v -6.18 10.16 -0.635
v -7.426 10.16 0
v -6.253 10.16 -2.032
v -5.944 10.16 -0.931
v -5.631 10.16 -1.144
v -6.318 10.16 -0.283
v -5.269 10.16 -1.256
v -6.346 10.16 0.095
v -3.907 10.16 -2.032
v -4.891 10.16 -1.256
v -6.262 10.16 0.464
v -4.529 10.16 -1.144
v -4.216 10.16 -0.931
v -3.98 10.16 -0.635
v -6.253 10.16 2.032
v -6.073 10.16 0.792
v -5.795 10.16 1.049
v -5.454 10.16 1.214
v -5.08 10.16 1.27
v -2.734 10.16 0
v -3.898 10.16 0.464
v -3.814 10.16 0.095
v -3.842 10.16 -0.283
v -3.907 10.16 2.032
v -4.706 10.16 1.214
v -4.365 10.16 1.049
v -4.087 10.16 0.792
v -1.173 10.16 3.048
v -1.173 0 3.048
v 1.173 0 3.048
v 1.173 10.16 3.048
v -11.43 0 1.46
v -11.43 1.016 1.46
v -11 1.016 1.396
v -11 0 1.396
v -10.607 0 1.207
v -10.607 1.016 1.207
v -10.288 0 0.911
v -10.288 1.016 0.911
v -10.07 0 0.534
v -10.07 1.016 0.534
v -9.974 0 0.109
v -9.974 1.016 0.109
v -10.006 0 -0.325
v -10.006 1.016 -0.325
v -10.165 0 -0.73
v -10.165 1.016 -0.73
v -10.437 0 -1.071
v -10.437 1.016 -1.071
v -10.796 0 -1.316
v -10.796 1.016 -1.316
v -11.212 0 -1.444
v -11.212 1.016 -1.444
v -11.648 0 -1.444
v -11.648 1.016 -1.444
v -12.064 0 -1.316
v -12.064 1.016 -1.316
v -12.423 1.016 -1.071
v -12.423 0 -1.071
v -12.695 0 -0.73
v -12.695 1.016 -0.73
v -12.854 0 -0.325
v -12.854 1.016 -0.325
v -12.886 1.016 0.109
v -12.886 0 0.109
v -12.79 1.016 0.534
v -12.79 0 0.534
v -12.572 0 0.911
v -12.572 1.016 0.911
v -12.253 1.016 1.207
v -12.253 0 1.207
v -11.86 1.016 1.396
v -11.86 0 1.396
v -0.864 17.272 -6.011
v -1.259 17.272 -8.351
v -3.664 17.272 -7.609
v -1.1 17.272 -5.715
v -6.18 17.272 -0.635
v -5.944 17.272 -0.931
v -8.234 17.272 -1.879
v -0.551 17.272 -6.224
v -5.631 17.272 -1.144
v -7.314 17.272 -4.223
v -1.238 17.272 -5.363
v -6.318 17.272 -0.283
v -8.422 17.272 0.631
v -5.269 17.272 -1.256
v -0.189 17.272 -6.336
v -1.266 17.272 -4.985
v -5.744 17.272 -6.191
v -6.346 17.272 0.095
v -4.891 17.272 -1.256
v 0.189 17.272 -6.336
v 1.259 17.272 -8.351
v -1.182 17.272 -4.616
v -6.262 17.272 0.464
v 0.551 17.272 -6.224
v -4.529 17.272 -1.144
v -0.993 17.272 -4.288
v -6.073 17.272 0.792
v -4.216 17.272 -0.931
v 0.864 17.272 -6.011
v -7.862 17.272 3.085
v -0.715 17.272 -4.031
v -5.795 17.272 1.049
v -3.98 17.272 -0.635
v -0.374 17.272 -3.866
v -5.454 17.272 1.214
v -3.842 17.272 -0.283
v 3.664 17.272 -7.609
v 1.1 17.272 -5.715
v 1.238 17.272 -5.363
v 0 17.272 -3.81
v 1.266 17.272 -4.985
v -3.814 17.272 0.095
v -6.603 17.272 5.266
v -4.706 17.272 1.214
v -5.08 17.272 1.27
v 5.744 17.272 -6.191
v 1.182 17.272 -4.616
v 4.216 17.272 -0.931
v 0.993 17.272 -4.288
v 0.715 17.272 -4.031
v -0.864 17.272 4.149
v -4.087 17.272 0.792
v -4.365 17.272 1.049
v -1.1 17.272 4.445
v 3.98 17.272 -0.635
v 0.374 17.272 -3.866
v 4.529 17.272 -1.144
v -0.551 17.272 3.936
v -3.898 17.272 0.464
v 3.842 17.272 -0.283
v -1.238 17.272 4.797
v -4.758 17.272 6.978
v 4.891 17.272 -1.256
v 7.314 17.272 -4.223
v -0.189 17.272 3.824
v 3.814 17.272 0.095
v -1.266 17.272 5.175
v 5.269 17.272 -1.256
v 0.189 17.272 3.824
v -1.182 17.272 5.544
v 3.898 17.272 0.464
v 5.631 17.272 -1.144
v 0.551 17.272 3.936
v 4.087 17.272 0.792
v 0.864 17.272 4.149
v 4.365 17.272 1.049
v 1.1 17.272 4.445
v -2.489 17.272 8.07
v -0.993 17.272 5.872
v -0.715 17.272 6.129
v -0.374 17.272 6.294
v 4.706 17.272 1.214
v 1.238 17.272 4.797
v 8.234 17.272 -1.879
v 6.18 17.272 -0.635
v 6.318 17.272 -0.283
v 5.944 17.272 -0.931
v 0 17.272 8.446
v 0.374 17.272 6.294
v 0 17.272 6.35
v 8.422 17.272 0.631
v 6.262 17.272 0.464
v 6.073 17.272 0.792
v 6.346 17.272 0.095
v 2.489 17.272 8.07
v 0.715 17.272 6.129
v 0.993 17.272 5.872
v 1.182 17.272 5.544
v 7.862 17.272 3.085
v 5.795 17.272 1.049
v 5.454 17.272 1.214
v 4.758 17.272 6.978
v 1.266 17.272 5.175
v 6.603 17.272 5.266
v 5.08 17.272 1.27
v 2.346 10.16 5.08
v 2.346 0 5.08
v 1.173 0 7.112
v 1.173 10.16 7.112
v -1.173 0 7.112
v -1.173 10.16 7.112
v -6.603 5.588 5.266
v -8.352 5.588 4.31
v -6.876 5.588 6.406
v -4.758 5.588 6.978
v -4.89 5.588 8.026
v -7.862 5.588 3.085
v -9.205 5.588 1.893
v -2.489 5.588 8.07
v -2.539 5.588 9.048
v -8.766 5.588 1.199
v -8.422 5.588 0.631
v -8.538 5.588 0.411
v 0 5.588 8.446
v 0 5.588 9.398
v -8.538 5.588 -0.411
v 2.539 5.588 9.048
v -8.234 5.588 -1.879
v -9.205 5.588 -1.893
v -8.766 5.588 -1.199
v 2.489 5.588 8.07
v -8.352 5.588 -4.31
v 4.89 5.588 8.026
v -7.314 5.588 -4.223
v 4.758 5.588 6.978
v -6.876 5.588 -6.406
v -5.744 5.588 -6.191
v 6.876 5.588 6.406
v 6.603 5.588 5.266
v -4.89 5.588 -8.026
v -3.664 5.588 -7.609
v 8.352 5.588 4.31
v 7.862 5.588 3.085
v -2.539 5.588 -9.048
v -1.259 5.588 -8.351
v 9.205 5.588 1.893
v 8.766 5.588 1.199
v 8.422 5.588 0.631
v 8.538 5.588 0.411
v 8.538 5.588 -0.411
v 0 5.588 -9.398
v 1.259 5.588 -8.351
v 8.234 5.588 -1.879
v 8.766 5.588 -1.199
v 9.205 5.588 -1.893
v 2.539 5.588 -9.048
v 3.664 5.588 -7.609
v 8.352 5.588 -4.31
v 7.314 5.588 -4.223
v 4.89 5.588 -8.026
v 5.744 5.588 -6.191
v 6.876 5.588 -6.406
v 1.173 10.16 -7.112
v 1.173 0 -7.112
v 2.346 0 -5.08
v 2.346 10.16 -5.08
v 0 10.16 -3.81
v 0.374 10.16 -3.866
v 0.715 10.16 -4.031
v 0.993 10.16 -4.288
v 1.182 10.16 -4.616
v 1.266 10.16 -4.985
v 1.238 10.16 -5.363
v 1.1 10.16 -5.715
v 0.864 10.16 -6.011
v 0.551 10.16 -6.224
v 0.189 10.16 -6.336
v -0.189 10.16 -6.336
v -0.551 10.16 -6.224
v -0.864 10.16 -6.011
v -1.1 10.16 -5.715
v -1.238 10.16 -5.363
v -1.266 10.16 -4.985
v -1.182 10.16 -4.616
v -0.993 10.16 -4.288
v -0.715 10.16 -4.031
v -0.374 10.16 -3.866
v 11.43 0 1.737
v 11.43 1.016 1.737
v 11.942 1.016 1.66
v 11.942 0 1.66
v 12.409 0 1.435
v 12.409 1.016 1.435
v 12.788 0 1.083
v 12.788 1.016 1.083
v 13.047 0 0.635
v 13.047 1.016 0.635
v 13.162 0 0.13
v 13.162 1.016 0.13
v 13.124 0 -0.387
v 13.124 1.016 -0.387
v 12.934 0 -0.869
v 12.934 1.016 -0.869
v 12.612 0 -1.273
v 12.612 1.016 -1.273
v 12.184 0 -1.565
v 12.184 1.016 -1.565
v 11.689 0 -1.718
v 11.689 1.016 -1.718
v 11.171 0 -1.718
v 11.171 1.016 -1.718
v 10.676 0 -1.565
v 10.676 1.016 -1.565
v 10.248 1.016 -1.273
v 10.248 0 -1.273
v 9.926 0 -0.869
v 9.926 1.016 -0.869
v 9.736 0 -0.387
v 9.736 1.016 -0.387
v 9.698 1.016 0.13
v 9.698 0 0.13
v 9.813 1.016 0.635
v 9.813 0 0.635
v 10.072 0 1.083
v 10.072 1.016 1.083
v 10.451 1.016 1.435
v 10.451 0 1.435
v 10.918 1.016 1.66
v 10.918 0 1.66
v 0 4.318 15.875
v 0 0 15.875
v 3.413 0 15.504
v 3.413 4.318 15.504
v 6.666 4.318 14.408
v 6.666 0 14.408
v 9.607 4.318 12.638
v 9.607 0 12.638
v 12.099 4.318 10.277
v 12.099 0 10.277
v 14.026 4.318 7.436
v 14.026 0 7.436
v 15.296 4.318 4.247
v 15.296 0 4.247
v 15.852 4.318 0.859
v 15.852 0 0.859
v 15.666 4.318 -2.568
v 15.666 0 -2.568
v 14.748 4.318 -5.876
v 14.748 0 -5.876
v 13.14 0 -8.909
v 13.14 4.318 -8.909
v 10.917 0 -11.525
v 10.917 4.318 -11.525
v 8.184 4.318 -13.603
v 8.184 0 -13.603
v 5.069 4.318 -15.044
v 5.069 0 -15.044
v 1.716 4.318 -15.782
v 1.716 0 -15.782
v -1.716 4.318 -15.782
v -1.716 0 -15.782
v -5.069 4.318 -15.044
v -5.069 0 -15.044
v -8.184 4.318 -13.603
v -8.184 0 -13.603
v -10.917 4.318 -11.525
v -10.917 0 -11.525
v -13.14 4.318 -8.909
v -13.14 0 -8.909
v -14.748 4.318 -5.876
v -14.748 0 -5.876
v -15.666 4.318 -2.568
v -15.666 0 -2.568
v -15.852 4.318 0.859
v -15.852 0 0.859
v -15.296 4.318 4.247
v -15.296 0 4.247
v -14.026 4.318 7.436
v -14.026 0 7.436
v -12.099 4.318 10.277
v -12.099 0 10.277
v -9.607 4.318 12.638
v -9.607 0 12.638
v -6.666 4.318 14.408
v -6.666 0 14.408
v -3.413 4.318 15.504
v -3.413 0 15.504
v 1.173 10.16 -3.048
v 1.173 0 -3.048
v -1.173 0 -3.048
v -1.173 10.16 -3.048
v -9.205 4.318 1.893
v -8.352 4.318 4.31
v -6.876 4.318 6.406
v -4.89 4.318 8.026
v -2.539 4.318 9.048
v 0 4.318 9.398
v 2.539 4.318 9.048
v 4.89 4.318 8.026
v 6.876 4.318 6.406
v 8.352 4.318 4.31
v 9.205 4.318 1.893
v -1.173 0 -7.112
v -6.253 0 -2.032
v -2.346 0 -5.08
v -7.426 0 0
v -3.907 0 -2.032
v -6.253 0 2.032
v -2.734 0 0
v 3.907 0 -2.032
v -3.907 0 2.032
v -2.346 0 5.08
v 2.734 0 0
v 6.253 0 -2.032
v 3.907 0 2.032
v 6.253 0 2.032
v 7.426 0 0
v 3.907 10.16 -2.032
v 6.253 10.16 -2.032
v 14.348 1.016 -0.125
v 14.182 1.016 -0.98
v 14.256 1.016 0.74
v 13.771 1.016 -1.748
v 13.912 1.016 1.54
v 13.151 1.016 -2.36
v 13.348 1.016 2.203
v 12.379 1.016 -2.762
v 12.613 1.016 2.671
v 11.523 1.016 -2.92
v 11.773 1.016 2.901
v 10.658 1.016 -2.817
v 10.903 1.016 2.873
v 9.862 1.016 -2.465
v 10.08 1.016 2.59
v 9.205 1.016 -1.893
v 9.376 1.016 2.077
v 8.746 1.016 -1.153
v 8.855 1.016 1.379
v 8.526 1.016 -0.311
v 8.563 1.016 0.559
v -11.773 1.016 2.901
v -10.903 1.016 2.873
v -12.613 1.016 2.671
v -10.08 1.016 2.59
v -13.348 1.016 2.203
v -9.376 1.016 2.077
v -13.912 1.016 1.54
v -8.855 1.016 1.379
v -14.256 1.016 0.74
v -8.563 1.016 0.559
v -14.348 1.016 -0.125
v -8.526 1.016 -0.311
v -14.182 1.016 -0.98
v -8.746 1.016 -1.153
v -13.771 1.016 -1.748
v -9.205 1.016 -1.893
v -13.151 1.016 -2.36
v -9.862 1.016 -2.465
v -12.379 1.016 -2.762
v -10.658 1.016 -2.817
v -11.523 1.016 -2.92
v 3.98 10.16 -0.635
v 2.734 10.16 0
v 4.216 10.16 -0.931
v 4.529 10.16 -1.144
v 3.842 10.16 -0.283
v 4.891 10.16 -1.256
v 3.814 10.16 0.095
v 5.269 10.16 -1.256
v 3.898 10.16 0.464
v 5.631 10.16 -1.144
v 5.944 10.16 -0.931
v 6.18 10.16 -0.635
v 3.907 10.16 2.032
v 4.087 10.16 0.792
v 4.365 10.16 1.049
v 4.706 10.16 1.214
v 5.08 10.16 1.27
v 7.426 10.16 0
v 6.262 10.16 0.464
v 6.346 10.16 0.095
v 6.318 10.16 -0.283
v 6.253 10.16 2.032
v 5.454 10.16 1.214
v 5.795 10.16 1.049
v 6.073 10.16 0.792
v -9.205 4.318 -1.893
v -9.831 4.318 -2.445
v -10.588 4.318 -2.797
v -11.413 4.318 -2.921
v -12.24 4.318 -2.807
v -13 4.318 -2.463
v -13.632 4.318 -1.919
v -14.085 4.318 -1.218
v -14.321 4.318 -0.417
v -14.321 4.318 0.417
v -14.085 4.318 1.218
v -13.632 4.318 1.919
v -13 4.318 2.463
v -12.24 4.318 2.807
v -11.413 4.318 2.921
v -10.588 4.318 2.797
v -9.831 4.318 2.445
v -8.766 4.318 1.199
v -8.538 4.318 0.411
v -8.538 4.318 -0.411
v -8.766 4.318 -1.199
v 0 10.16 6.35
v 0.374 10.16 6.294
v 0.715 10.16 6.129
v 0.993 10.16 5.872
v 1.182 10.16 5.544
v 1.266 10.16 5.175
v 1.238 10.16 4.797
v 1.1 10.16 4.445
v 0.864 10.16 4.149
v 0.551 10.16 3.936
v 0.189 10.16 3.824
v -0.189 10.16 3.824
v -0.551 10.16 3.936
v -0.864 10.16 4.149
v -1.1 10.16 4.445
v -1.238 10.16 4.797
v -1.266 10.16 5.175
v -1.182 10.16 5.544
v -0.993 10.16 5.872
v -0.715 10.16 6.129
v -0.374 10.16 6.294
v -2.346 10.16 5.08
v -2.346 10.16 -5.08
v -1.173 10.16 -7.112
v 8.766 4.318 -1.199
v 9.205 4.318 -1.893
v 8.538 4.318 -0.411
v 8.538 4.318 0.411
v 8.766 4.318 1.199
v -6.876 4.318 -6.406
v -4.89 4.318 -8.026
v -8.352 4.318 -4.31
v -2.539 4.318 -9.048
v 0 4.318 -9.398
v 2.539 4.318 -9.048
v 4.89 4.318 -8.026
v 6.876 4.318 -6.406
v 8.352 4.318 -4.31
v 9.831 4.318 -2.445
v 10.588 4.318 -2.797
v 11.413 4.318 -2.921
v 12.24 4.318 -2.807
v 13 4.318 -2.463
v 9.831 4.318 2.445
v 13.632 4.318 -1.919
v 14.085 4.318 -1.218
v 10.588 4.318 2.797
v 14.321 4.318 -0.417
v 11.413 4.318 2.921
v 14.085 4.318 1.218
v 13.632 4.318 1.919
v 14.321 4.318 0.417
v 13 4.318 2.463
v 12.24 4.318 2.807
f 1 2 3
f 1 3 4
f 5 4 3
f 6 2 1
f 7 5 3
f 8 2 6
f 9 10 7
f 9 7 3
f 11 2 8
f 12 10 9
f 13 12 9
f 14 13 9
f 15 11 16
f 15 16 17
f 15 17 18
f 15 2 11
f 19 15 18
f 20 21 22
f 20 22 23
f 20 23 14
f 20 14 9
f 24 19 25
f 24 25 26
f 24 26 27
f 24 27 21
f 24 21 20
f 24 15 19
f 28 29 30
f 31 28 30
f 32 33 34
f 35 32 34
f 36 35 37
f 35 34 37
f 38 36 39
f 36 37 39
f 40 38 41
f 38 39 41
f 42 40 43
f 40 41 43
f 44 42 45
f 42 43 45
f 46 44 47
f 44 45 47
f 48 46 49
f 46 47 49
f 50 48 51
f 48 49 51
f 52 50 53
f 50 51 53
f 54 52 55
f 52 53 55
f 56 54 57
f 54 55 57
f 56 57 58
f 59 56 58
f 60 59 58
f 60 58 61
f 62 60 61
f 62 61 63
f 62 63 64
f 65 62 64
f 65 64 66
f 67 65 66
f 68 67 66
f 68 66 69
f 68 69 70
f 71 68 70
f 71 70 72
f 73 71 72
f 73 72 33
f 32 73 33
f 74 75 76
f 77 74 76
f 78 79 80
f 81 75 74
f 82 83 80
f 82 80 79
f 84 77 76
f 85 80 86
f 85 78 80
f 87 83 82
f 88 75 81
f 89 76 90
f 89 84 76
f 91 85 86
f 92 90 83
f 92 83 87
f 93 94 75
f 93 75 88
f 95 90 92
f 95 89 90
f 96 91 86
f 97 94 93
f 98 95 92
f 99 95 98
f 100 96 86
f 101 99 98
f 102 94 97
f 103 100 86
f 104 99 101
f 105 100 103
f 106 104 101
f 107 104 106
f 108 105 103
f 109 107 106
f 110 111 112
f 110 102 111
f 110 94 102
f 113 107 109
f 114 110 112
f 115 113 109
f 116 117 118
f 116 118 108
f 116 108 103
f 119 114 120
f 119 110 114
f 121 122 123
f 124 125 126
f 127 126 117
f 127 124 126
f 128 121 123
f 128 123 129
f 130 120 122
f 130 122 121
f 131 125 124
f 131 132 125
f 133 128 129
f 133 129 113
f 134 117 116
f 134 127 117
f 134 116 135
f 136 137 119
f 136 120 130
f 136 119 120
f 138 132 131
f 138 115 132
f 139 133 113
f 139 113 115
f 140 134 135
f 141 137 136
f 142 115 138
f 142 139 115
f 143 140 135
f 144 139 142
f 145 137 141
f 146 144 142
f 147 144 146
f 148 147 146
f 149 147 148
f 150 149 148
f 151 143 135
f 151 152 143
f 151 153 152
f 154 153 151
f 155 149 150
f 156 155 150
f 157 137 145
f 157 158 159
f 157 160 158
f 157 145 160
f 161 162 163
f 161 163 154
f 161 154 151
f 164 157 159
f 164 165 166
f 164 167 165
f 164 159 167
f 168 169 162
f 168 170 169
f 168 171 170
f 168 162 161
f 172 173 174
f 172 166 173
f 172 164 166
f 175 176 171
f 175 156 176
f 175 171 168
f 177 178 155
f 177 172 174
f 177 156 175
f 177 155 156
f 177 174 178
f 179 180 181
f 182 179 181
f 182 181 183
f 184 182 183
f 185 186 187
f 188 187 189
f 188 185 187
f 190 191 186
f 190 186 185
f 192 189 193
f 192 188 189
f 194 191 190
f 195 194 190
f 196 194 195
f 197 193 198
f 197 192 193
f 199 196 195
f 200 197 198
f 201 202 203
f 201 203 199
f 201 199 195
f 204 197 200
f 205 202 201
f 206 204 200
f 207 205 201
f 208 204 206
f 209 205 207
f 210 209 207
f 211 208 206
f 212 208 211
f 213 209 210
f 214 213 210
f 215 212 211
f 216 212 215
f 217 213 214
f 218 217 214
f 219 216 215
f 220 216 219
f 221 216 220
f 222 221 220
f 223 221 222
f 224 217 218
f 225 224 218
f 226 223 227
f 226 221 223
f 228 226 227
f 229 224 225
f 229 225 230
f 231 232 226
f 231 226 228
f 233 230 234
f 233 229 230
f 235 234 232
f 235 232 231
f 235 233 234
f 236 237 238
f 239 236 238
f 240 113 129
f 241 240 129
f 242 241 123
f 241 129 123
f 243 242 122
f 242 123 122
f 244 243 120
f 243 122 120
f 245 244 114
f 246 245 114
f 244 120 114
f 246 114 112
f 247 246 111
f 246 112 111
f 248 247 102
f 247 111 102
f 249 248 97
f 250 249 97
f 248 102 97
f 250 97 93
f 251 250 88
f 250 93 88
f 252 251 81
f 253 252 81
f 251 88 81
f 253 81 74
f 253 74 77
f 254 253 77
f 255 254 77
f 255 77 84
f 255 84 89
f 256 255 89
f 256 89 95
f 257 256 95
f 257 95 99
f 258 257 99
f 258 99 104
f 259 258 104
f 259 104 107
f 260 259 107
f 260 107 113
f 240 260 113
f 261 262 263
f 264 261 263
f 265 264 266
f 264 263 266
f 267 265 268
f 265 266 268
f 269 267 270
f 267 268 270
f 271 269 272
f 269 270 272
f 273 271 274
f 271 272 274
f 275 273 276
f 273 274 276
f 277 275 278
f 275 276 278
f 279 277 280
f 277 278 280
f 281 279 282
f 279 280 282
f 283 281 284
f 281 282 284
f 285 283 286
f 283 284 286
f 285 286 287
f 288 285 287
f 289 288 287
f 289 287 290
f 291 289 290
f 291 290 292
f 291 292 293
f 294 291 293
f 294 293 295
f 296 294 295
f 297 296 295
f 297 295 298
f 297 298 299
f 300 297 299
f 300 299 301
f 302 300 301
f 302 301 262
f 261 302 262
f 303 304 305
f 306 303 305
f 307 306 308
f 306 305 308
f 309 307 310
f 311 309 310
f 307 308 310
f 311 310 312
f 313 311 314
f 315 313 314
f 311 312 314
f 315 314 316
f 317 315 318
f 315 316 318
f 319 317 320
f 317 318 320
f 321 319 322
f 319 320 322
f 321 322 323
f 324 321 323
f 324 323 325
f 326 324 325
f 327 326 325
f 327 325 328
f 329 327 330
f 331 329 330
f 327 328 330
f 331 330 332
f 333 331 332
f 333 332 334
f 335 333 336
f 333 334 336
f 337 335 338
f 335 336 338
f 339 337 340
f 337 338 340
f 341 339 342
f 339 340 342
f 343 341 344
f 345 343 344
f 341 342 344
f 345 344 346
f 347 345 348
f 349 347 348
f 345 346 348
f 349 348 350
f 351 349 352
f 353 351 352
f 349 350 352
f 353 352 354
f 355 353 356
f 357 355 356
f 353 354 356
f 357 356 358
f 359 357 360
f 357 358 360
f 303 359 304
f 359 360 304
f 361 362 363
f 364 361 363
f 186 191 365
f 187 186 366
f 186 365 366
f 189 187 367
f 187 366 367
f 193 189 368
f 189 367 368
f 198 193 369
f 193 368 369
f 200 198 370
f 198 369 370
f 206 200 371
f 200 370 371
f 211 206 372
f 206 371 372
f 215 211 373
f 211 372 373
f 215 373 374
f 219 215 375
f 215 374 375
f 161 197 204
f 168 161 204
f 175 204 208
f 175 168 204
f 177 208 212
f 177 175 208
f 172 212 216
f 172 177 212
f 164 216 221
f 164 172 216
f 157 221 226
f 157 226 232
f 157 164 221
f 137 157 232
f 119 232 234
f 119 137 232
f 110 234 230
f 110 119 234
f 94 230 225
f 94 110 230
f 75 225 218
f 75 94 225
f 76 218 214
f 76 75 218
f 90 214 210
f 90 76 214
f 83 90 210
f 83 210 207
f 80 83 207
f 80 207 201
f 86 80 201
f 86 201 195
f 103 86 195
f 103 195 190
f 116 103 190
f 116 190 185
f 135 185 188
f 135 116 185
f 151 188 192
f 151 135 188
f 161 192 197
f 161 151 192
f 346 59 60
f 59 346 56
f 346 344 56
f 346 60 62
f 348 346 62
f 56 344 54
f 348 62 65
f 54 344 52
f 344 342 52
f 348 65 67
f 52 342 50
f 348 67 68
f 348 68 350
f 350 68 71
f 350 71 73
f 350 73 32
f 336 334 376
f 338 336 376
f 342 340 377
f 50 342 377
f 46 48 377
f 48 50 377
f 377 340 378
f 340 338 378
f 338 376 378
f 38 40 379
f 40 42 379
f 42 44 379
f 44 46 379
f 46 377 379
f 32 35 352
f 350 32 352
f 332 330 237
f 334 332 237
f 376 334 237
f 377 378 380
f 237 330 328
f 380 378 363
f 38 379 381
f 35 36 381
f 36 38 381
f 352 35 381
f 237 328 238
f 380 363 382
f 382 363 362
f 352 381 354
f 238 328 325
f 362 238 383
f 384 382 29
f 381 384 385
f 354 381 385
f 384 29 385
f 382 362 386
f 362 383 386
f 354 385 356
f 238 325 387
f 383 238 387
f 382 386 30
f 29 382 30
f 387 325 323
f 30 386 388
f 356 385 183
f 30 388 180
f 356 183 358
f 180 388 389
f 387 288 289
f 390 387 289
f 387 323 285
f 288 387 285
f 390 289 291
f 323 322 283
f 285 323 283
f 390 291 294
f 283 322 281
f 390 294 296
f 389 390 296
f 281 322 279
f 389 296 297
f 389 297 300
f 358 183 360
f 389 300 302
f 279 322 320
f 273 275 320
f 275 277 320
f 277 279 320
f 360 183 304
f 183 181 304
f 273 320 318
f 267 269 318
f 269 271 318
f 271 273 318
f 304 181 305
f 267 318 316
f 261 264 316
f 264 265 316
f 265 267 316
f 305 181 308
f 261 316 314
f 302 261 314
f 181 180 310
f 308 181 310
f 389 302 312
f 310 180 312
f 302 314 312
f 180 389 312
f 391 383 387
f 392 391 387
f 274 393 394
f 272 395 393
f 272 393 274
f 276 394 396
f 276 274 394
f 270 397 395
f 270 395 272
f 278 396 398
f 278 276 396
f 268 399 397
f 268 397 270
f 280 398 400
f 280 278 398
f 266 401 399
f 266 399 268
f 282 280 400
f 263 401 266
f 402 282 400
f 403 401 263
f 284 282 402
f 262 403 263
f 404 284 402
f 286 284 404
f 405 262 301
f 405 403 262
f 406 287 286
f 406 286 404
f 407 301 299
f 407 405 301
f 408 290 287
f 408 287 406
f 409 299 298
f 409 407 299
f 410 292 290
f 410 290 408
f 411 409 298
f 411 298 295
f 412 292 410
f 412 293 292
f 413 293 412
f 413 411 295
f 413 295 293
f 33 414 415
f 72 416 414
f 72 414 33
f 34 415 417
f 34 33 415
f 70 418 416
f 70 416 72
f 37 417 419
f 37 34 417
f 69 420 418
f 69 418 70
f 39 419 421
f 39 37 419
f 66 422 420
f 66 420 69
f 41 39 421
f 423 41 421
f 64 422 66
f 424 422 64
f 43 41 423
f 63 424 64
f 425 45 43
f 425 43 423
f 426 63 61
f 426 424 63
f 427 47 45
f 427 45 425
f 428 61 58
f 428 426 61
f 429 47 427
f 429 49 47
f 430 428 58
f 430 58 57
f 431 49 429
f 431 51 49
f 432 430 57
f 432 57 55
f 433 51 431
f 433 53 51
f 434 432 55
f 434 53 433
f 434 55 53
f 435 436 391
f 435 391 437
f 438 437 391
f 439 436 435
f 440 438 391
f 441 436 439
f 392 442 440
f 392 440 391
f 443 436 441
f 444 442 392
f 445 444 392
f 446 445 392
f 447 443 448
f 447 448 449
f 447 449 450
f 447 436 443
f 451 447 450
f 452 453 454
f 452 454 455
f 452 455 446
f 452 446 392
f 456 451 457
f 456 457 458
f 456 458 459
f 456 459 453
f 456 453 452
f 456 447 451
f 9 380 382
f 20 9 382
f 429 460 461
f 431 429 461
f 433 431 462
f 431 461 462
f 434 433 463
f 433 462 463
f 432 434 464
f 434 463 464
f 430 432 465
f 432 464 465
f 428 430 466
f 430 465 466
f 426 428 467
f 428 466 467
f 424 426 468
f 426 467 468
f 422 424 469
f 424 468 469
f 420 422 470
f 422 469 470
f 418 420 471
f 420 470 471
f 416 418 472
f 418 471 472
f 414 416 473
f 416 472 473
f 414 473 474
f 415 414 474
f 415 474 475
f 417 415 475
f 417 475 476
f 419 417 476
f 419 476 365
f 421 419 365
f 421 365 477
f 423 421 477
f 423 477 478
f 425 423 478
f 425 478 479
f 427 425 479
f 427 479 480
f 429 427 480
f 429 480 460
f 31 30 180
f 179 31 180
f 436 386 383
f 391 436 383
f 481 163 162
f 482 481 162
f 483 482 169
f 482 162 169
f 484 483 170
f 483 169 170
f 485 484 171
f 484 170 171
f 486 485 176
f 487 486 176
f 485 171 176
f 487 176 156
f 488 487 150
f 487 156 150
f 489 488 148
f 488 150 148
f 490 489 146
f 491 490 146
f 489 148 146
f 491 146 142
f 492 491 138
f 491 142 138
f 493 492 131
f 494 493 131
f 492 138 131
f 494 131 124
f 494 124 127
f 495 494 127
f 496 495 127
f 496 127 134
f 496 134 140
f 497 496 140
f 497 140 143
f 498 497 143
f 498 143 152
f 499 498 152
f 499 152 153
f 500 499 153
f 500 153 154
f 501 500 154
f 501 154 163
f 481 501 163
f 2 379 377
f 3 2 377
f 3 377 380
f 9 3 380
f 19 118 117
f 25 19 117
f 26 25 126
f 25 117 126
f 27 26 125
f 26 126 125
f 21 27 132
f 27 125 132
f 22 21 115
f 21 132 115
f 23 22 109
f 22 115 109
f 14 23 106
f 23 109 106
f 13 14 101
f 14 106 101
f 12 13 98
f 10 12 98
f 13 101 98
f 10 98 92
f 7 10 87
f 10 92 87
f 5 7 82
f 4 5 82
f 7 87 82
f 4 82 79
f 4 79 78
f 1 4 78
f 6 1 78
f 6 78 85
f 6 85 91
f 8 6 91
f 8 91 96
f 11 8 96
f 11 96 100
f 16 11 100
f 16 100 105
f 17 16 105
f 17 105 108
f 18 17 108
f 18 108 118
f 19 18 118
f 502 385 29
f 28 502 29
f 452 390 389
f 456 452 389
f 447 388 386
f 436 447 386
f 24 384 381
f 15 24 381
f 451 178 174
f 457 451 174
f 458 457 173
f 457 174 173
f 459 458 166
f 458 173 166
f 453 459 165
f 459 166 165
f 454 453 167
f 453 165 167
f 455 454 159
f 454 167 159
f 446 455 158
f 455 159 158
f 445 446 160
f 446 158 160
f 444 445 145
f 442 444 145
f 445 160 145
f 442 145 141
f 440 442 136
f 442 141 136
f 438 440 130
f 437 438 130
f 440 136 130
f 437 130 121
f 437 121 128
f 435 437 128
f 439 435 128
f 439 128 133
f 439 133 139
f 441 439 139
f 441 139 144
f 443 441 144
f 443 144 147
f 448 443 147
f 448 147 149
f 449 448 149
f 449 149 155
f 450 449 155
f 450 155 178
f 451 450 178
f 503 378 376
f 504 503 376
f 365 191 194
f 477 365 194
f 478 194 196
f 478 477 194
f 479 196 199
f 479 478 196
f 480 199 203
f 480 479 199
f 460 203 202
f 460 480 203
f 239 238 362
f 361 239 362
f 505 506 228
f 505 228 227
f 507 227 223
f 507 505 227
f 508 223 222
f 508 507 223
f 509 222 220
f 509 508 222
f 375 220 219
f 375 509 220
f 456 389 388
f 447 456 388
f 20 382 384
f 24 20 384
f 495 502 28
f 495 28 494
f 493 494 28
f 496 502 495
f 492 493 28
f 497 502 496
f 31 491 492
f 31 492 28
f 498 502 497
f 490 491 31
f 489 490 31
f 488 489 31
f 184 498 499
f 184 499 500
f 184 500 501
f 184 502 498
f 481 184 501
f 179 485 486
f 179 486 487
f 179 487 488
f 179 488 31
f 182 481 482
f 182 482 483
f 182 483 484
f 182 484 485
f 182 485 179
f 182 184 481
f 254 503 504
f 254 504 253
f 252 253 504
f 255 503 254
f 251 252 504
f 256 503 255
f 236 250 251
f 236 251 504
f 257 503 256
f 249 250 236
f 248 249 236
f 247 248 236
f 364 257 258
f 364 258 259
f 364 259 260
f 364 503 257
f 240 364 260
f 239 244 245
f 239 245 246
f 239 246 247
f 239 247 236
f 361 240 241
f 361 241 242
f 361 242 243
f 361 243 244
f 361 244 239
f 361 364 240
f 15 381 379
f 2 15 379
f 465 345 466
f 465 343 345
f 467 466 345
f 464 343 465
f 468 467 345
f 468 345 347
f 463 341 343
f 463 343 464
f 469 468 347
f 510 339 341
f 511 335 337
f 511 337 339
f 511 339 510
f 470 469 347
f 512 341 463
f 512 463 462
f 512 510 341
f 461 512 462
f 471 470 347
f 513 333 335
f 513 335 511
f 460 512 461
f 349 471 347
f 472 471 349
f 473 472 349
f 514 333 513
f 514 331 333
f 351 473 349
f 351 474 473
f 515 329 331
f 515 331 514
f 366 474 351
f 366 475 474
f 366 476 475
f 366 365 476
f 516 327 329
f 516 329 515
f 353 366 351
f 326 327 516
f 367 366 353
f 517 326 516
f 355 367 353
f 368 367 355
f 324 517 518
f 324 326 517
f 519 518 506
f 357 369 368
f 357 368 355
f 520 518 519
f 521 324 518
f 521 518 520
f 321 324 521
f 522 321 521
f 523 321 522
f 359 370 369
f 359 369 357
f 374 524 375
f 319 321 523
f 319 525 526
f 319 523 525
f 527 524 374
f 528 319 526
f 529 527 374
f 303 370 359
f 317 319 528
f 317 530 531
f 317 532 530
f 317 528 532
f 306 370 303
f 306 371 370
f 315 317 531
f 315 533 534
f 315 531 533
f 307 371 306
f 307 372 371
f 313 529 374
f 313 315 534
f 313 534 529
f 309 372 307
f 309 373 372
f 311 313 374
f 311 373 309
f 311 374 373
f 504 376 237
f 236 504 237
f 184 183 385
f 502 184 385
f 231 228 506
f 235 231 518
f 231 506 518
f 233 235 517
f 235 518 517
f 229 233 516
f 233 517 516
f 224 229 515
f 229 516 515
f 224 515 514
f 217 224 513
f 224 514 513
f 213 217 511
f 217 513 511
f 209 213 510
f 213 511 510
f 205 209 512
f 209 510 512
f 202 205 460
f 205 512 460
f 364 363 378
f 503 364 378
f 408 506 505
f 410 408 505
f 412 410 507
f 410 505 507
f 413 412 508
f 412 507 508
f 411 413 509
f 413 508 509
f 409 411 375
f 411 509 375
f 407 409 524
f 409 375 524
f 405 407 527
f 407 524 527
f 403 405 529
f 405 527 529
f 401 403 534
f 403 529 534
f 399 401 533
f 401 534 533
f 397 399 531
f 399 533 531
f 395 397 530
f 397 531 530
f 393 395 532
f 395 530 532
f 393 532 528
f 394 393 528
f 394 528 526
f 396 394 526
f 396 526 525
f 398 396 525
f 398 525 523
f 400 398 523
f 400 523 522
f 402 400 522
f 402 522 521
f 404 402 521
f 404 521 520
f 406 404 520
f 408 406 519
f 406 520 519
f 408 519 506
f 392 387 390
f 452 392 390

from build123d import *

# Parameters (mm, degrees)
SKETCH1_R               = 15.875
BOSS_EXTRUDE1_DEPTH     = 4.318
SKETCH4_R               = 9.398
BOSS_EXTRUDE2_DEPTH     = 12.954
SKETCH5_R               = 2.921
CUT_EXTRUDE1_DEPTH      = 26.919825732
CUT_EXTRUDE1_DEPTH_BACK = 3.302
SKETCH6_R               = 1.4605
SKETCH6_R_2             = 1.73706236
CUT_EXTRUDE2_DEPTH      = 26.919825732
CUT_EXTRUDE2_DEPTH_BACK = 26.919825732
SKETCH10_R              = 1.27
CUT_EXTRUDE6_DEPTH      = 29.325840394
SKETCH12_R              = 9.398
SKETCH12_R_2            = 8.4455
CUT_EXTRUDE8_DEPTH      = 11.684
CUT_EXTRUDE9_DEPTH      = 10.16


with BuildPart() as part:
    # Sketch1 → Boss-Extrude1 (new body)
    with BuildSketch(Plane(origin=(0, 0, 0), x_dir=(1, 0, 0), z_dir=(0, 1, 0))):
        with Locations(Location((0, 0, 0), (0, 0, 270))):
            Circle(SKETCH1_R)
    extrude(amount=BOSS_EXTRUDE1_DEPTH)

    # Sketch4 → Boss-Extrude2 (add)
    with BuildSketch(Plane(origin=(0, 4.318, 0), x_dir=(1, 0, 0), z_dir=(0, 1, 0))):
        with Locations(Location((0, 0, 0), (0, 0, 270))):
            Circle(SKETCH4_R)
    extrude(amount=BOSS_EXTRUDE2_DEPTH)

    # Sketch5 → Cut-Extrude1 (cut, two sides)
    with BuildSketch(Plane(origin=(0, 4.318, 0), x_dir=(1, 0, 0), z_dir=(0, 1, 0))) as cut_extrude1_sk:
        with Locations(Location((-11.43, 0, 0), (0, 0, 40.395058429))):
            Circle(SKETCH5_R)
        with Locations(Location((11.43, 0, 0), (0, 0, 139.604941571))):
            Circle(SKETCH5_R)
    extrude(amount=CUT_EXTRUDE1_DEPTH, mode=Mode.SUBTRACT)
    extrude(cut_extrude1_sk.sketch, amount=-CUT_EXTRUDE1_DEPTH_BACK, mode=Mode.SUBTRACT)

    # Sketch6 → Cut-Extrude2 (cut, two sides)
    with BuildSketch(Plane(origin=(0, 4.318, 0), x_dir=(1, 0, 0), z_dir=(0, 1, 0))) as cut_extrude2_sk:
        with Locations(Location((-11.43, 0, 0), (0, 0, 270))):
            Circle(SKETCH6_R)
        with Locations(Location((11.43, 0, 0), (0, 0, 270))):
            Circle(SKETCH6_R_2)
    extrude(amount=CUT_EXTRUDE2_DEPTH, mode=Mode.SUBTRACT)
    extrude(cut_extrude2_sk.sketch, amount=-CUT_EXTRUDE2_DEPTH_BACK, mode=Mode.SUBTRACT)

    # Sketch10 → Cut-Extrude6 (cut, through all)
    with BuildSketch(Plane(origin=(0, 17.272, 0), x_dir=(1, 0, 0), z_dir=(0, 1, 0))):
        with Locations(Location((0, 5.08, 0), (0, 0, 270))):
            Circle(SKETCH10_R)
        with Locations(Location((0, -5.08, 0), (0, 0, 270))):
            Circle(SKETCH10_R)
        with Locations(Location((5.08, 0, 0), (0, 0, 270))):
            Circle(SKETCH10_R)
        with Locations(Location((-5.08, 0, 0), (0, 0, 270))):
            Circle(SKETCH10_R)
    extrude(amount=-CUT_EXTRUDE6_DEPTH, mode=Mode.SUBTRACT)

    # Sketch12 → Cut-Extrude8 (cut)
    with BuildSketch(Plane(origin=(0, 17.272, 0), x_dir=(1, 0, 0), z_dir=(0, 1, 0))):
        Circle(SKETCH12_R)
        with Locations(Location((0, 0, 0), (0, 0, 270))):
            Circle(SKETCH12_R_2, mode=Mode.SUBTRACT)
    extrude(amount=-CUT_EXTRUDE8_DEPTH, mode=Mode.SUBTRACT)

    # Sketch13 → Cut-Extrude9 (cut)
    with BuildSketch(Plane.XZ):
        Polygon((7.426351494, 0), (6.253175747, 2.032), (3.906824253, 2.032), (2.733648506, 0), (3.906824253, -2.032), (6.253175747, -2.032), align=None)
        Polygon((2.346351494, -5.08), (1.173175747, -3.048), (-1.173175747, -3.048), (-2.346351494, -5.08), (-1.173175747, -7.112), (1.173175747, -7.112), align=None)
        Polygon((-2.733648506, 0), (-3.906824253, 2.032), (-6.253175747, 2.032), (-7.426351494, 0), (-6.253175747, -2.032), (-3.906824253, -2.032), align=None)
        Polygon((2.346351494, 5.08), (1.173175747, 7.112), (-1.173175747, 7.112), (-2.346351494, 5.08), (-1.173175747, 3.048), (1.173175747, 3.048), align=None)
    extrude(amount=-CUT_EXTRUDE9_DEPTH, mode=Mode.SUBTRACT)


solid = part.part
